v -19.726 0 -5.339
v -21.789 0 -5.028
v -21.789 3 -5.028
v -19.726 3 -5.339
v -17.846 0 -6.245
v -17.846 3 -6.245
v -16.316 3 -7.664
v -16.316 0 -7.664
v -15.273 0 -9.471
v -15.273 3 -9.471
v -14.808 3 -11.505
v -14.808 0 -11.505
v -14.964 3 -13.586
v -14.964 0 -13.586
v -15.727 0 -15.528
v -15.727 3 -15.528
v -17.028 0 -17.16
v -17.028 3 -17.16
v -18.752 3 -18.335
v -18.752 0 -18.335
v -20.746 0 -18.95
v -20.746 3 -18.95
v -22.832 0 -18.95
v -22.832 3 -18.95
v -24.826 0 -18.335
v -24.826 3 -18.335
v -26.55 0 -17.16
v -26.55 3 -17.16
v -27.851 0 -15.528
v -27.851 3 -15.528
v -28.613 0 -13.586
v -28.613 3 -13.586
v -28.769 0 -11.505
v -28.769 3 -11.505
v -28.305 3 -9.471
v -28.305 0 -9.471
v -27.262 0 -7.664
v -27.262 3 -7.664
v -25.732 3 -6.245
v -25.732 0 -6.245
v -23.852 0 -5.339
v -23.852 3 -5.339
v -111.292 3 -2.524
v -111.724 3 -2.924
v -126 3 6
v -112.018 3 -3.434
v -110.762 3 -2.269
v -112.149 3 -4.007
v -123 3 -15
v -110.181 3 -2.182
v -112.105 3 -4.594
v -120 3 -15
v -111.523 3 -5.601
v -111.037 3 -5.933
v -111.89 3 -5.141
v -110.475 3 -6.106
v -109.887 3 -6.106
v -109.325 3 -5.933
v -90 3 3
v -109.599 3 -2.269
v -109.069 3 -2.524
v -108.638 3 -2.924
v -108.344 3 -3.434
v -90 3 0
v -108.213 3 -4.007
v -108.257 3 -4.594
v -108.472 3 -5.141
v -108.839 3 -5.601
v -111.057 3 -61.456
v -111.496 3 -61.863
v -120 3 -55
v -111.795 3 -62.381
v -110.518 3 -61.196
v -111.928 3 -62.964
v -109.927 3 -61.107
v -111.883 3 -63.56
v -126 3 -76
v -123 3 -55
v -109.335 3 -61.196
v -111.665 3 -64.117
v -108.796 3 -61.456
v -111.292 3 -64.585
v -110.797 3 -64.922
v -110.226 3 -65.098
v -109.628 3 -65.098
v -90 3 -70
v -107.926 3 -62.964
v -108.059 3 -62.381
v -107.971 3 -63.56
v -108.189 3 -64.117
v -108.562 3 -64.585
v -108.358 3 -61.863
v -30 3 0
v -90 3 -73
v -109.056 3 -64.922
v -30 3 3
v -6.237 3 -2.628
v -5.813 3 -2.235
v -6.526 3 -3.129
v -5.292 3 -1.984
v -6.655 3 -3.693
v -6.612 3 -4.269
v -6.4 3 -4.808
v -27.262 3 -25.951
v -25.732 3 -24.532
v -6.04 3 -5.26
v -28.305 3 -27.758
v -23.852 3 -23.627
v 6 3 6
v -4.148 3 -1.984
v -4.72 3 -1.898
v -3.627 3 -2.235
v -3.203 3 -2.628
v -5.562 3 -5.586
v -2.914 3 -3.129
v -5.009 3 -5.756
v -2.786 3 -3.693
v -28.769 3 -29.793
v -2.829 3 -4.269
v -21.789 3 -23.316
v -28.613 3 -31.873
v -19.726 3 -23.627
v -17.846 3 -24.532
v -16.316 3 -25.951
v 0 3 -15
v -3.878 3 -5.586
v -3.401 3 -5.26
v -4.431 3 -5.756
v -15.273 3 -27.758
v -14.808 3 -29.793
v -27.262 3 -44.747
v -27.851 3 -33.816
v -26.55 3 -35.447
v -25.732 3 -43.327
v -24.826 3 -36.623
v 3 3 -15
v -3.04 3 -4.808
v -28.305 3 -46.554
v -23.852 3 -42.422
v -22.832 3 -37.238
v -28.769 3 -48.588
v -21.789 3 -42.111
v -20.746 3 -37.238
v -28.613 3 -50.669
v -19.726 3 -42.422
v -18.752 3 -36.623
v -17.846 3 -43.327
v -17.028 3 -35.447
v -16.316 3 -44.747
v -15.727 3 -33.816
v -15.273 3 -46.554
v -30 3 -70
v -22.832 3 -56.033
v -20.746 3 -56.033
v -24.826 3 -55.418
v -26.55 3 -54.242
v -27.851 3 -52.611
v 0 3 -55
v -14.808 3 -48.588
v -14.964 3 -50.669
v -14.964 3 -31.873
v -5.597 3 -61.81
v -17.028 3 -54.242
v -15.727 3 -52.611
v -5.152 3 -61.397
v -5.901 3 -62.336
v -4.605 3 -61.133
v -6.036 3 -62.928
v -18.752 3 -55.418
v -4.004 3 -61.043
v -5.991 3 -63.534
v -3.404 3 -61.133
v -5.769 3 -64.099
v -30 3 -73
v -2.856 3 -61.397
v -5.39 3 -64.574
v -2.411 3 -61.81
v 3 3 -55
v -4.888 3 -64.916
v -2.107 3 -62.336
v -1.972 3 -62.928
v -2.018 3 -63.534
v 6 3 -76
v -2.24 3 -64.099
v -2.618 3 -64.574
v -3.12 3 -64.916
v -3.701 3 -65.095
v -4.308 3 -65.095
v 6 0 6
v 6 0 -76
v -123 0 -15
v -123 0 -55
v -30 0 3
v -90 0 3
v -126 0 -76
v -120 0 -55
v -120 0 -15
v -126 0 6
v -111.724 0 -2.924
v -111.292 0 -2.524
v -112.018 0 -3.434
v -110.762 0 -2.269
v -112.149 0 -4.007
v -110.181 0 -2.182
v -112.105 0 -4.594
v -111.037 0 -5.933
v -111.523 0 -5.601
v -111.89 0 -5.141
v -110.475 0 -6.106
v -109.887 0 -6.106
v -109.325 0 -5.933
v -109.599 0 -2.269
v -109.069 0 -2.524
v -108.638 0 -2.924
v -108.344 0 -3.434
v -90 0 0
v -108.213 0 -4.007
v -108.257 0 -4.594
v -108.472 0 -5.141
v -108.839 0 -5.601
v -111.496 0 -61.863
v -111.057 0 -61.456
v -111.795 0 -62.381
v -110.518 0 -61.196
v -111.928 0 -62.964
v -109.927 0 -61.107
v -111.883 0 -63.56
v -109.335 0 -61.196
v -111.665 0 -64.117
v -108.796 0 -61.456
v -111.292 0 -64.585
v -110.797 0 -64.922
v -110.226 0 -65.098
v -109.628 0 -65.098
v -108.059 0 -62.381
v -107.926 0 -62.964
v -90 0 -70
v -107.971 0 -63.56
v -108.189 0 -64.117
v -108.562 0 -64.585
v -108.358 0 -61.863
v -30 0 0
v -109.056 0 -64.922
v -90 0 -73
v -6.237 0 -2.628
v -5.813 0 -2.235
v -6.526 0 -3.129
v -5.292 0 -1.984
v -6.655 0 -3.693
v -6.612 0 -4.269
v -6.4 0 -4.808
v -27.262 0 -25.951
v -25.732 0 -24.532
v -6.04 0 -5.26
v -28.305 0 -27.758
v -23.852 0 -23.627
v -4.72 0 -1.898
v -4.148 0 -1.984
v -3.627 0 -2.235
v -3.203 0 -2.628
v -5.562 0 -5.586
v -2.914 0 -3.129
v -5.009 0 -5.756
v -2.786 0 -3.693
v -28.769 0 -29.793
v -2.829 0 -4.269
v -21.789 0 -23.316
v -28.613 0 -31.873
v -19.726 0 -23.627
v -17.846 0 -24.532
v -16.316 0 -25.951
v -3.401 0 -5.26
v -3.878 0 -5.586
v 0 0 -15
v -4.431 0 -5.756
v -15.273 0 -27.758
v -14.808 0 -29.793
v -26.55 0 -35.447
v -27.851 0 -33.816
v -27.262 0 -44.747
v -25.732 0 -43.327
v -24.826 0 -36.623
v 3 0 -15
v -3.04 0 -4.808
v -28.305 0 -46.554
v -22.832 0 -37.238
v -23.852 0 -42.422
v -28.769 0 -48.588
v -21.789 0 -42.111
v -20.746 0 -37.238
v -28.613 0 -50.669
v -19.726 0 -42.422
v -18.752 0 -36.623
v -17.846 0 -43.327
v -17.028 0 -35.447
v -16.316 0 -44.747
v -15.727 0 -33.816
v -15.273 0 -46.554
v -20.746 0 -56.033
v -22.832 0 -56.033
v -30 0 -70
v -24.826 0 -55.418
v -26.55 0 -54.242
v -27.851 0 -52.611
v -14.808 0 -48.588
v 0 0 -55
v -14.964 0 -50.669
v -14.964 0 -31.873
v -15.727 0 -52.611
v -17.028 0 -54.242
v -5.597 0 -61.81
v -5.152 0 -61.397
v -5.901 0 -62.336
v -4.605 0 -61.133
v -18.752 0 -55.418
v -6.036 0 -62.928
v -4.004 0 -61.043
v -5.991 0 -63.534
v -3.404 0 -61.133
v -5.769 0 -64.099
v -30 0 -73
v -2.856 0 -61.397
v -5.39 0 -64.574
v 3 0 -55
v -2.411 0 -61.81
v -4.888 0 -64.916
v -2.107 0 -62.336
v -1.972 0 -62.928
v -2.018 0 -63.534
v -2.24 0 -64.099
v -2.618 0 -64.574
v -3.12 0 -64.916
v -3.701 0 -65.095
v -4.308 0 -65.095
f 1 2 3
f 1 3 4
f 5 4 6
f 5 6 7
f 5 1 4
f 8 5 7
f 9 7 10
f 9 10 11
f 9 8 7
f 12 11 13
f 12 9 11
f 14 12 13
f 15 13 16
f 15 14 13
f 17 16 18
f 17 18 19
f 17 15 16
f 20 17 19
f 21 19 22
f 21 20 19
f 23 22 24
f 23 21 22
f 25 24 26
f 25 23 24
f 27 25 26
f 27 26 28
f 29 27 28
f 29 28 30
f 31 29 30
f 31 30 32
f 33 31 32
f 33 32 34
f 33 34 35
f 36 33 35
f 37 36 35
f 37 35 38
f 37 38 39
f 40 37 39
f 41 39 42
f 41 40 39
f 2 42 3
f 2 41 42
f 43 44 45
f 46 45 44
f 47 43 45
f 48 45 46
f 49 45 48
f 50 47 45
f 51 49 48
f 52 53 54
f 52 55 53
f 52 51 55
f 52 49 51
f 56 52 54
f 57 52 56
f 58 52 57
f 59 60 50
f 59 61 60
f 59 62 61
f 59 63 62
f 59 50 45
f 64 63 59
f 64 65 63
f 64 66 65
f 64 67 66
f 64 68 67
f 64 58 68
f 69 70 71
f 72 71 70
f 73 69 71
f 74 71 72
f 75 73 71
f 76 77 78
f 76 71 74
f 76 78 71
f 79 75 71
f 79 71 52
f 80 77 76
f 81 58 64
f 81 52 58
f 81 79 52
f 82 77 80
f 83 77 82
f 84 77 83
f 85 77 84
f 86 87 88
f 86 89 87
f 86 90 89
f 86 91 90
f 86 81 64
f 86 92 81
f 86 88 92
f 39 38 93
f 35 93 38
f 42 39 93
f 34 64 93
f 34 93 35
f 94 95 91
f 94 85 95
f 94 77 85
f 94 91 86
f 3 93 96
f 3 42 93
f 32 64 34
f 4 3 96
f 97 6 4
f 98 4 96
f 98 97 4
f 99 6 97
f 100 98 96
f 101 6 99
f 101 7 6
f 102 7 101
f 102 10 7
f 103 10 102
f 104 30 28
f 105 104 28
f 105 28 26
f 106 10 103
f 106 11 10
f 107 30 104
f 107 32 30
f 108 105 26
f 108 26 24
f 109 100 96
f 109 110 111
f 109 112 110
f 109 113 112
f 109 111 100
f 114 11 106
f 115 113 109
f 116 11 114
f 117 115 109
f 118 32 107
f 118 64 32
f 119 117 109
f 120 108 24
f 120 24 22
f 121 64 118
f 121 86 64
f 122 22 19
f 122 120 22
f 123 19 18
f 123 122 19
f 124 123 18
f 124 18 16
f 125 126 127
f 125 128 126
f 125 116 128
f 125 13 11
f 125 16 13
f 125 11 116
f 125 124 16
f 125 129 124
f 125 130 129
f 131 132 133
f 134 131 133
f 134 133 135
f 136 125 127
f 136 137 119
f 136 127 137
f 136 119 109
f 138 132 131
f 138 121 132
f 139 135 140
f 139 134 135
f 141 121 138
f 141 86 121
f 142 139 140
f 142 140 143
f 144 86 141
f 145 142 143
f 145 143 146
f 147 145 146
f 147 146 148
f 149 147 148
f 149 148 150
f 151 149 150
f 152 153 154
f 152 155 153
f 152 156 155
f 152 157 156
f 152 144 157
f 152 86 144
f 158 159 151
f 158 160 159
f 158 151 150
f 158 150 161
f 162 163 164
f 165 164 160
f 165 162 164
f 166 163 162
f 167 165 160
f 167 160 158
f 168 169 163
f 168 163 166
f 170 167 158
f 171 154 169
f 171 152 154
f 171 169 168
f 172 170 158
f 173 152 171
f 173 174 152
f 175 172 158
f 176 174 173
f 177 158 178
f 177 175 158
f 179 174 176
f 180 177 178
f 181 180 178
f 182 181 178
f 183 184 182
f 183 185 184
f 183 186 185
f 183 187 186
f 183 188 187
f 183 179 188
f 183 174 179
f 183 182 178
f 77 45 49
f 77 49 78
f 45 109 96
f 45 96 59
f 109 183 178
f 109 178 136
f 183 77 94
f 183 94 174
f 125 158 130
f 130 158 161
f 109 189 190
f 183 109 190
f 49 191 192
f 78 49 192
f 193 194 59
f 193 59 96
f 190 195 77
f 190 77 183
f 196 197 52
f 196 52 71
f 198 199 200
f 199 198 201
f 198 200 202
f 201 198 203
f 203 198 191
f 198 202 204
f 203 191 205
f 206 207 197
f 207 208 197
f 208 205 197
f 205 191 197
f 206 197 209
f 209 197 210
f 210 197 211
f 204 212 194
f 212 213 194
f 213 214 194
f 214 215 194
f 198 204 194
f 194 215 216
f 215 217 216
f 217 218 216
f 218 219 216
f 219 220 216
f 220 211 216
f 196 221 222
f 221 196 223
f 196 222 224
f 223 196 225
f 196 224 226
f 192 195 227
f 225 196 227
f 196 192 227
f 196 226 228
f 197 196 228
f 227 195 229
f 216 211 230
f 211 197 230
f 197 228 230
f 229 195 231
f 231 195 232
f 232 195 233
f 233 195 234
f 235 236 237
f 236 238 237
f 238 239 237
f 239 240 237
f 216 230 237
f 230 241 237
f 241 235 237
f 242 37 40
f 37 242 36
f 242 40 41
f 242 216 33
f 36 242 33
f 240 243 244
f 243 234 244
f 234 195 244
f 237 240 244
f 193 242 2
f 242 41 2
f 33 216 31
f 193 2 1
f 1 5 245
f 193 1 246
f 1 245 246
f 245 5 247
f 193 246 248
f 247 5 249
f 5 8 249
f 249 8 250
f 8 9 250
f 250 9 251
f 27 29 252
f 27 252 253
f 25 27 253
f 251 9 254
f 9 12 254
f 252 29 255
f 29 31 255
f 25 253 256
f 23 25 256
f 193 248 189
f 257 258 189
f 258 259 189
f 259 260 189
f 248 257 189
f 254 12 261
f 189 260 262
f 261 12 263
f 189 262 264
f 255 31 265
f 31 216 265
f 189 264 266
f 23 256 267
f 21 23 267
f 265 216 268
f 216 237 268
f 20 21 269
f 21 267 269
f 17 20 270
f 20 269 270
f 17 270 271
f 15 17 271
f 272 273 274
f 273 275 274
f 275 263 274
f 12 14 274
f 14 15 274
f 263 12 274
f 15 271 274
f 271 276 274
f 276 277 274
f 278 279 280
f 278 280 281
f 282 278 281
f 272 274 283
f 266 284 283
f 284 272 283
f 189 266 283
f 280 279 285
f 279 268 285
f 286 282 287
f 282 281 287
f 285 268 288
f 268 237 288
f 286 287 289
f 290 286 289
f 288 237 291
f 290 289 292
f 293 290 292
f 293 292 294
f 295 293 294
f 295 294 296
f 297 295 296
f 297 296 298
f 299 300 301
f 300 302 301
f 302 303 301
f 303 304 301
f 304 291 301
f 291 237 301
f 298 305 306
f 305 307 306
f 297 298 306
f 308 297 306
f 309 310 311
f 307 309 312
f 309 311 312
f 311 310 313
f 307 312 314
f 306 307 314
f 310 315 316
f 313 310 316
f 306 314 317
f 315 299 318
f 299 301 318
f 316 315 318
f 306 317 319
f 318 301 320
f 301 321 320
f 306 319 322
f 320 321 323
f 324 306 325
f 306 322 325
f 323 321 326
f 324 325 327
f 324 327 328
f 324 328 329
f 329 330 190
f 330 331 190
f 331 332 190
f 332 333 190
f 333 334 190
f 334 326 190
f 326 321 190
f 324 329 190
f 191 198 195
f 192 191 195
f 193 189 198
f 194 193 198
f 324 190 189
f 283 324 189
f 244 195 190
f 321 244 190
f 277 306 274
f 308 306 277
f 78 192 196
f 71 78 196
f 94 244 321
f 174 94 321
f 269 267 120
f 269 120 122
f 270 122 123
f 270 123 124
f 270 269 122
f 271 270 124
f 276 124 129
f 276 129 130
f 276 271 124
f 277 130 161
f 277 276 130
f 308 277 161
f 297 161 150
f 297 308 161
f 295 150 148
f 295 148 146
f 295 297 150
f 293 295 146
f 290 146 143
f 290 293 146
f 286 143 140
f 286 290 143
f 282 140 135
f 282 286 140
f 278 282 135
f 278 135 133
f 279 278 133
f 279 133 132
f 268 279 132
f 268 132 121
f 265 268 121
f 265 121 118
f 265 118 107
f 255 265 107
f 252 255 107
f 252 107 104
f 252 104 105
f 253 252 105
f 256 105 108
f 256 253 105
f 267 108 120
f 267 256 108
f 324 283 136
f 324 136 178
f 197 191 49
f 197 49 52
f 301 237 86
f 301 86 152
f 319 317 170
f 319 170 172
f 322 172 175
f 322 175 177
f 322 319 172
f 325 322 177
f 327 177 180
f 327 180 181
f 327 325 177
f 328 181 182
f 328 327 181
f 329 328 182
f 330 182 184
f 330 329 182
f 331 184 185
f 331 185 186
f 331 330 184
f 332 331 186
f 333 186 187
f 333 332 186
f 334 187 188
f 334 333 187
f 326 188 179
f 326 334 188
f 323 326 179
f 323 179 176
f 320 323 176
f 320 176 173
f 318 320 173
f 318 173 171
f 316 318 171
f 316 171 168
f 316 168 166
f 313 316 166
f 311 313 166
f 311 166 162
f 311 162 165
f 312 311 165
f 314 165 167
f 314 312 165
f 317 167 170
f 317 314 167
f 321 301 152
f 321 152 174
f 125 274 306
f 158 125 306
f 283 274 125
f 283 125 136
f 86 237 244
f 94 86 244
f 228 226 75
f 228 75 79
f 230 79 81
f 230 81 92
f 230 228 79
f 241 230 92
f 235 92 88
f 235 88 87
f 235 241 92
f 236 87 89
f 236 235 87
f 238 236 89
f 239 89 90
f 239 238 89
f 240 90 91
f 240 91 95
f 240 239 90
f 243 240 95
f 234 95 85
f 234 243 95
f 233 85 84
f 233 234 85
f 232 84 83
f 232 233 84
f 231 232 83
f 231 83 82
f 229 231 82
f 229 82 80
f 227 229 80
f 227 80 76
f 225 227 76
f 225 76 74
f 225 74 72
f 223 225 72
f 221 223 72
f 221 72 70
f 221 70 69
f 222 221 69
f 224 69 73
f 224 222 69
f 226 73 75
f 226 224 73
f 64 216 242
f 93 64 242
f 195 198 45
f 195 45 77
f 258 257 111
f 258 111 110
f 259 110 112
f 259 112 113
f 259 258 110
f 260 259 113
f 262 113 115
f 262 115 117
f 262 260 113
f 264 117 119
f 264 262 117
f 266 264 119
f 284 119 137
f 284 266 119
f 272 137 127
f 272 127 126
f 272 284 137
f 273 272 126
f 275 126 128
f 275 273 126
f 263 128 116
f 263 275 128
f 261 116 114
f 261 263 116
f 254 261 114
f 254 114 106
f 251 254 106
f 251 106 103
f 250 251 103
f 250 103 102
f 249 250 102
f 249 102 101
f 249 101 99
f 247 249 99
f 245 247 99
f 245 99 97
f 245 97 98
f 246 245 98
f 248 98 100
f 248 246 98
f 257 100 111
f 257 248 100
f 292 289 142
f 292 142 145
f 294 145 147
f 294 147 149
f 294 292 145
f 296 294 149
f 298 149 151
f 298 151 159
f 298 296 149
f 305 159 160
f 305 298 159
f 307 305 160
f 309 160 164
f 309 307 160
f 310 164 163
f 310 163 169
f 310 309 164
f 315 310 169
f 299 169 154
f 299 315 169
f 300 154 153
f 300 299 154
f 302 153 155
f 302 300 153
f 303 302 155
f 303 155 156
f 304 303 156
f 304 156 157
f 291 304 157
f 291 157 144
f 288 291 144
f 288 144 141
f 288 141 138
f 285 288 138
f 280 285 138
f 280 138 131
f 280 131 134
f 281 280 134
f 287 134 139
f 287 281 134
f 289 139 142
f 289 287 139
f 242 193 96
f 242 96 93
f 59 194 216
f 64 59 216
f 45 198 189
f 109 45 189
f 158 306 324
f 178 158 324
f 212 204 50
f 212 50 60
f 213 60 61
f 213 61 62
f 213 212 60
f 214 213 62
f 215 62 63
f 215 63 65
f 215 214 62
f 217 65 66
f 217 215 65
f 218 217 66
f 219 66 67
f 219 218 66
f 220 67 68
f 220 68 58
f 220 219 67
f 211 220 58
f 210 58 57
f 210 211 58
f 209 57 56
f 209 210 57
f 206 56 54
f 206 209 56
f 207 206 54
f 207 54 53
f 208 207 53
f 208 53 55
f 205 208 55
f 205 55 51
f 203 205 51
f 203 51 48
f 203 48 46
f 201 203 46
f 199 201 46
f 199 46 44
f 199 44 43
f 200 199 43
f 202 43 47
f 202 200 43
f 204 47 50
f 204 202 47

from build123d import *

# Parameters (mm, degrees)
SKETCH2_W           = 132
SKETCH2_H           = 82
SKETCH2_R           = 2.0066
SKETCH2_R_2         = 1.973275495
SKETCH2_R_3         = 2.037679125
SKETCH2_R_4         = 1.940146634
SKETCH2_R_5         = 7
SKETCH2_W_2         = 3
SKETCH2_H_2         = 40
SKETCH2_W_3         = 60
SKETCH2_H_3         = 3
BOSS_EXTRUDE1_DEPTH = 3


with BuildPart() as part:
    # Sketch2 → Boss-Extrude1 (new body)
    with BuildSketch(Plane(origin=(0, 0, 0), x_dir=(1, 0, 0), z_dir=(0, 1, 0))):
        with Locations((-60, 35)):
            Rectangle(SKETCH2_W, SKETCH2_H)
        with Locations(Location((-109.92679739, 63.113788195, 0), (0, 0, 270))):
            Circle(SKETCH2_R, mode=Mode.SUBTRACT)
        with Locations(Location((-110.18079739, 4.154783893, 0), (0, 0, 270))):
            Circle(SKETCH2_R_2, mode=Mode.SUBTRACT)
        with Locations(Location((-4.004277447, 63.080540095, 0), (0, 0, 270))):
            Circle(SKETCH2_R_3, mode=Mode.SUBTRACT)
        with Locations(Location((-4.720233043, 3.837756232, 0), (0, 0, 270))):
            Circle(SKETCH2_R_4, mode=Mode.SUBTRACT)
        with Locations(Location((-21.78879739, 49.11107203, 0), (0, 0, 270))):
            Circle(SKETCH2_R_5, mode=Mode.SUBTRACT)
        with Locations(Location((-21.78879739, 30.315787724, 0), (0, 0, 270))):
            Circle(SKETCH2_R_5, mode=Mode.SUBTRACT)
        with Locations(Location((-21.78879739, 12.028484075, 0), (0, 0, 270))):
            Circle(SKETCH2_R_5, mode=Mode.SUBTRACT)
        with Locations((1.5, 35)):
            Rectangle(SKETCH2_W_2, SKETCH2_H_2, mode=Mode.SUBTRACT)
        with Locations((-121.5, 35)):
            Rectangle(SKETCH2_W_2, SKETCH2_H_2, mode=Mode.SUBTRACT)
        with Locations((-60, 71.5)):
            Rectangle(SKETCH2_W_3, SKETCH2_H_3, mode=Mode.SUBTRACT)
        with Locations((-60, -1.5)):
            Rectangle(SKETCH2_W_3, SKETCH2_H_3, mode=Mode.SUBTRACT)
    extrude(amount=BOSS_EXTRUDE1_DEPTH)


solid = part.part
